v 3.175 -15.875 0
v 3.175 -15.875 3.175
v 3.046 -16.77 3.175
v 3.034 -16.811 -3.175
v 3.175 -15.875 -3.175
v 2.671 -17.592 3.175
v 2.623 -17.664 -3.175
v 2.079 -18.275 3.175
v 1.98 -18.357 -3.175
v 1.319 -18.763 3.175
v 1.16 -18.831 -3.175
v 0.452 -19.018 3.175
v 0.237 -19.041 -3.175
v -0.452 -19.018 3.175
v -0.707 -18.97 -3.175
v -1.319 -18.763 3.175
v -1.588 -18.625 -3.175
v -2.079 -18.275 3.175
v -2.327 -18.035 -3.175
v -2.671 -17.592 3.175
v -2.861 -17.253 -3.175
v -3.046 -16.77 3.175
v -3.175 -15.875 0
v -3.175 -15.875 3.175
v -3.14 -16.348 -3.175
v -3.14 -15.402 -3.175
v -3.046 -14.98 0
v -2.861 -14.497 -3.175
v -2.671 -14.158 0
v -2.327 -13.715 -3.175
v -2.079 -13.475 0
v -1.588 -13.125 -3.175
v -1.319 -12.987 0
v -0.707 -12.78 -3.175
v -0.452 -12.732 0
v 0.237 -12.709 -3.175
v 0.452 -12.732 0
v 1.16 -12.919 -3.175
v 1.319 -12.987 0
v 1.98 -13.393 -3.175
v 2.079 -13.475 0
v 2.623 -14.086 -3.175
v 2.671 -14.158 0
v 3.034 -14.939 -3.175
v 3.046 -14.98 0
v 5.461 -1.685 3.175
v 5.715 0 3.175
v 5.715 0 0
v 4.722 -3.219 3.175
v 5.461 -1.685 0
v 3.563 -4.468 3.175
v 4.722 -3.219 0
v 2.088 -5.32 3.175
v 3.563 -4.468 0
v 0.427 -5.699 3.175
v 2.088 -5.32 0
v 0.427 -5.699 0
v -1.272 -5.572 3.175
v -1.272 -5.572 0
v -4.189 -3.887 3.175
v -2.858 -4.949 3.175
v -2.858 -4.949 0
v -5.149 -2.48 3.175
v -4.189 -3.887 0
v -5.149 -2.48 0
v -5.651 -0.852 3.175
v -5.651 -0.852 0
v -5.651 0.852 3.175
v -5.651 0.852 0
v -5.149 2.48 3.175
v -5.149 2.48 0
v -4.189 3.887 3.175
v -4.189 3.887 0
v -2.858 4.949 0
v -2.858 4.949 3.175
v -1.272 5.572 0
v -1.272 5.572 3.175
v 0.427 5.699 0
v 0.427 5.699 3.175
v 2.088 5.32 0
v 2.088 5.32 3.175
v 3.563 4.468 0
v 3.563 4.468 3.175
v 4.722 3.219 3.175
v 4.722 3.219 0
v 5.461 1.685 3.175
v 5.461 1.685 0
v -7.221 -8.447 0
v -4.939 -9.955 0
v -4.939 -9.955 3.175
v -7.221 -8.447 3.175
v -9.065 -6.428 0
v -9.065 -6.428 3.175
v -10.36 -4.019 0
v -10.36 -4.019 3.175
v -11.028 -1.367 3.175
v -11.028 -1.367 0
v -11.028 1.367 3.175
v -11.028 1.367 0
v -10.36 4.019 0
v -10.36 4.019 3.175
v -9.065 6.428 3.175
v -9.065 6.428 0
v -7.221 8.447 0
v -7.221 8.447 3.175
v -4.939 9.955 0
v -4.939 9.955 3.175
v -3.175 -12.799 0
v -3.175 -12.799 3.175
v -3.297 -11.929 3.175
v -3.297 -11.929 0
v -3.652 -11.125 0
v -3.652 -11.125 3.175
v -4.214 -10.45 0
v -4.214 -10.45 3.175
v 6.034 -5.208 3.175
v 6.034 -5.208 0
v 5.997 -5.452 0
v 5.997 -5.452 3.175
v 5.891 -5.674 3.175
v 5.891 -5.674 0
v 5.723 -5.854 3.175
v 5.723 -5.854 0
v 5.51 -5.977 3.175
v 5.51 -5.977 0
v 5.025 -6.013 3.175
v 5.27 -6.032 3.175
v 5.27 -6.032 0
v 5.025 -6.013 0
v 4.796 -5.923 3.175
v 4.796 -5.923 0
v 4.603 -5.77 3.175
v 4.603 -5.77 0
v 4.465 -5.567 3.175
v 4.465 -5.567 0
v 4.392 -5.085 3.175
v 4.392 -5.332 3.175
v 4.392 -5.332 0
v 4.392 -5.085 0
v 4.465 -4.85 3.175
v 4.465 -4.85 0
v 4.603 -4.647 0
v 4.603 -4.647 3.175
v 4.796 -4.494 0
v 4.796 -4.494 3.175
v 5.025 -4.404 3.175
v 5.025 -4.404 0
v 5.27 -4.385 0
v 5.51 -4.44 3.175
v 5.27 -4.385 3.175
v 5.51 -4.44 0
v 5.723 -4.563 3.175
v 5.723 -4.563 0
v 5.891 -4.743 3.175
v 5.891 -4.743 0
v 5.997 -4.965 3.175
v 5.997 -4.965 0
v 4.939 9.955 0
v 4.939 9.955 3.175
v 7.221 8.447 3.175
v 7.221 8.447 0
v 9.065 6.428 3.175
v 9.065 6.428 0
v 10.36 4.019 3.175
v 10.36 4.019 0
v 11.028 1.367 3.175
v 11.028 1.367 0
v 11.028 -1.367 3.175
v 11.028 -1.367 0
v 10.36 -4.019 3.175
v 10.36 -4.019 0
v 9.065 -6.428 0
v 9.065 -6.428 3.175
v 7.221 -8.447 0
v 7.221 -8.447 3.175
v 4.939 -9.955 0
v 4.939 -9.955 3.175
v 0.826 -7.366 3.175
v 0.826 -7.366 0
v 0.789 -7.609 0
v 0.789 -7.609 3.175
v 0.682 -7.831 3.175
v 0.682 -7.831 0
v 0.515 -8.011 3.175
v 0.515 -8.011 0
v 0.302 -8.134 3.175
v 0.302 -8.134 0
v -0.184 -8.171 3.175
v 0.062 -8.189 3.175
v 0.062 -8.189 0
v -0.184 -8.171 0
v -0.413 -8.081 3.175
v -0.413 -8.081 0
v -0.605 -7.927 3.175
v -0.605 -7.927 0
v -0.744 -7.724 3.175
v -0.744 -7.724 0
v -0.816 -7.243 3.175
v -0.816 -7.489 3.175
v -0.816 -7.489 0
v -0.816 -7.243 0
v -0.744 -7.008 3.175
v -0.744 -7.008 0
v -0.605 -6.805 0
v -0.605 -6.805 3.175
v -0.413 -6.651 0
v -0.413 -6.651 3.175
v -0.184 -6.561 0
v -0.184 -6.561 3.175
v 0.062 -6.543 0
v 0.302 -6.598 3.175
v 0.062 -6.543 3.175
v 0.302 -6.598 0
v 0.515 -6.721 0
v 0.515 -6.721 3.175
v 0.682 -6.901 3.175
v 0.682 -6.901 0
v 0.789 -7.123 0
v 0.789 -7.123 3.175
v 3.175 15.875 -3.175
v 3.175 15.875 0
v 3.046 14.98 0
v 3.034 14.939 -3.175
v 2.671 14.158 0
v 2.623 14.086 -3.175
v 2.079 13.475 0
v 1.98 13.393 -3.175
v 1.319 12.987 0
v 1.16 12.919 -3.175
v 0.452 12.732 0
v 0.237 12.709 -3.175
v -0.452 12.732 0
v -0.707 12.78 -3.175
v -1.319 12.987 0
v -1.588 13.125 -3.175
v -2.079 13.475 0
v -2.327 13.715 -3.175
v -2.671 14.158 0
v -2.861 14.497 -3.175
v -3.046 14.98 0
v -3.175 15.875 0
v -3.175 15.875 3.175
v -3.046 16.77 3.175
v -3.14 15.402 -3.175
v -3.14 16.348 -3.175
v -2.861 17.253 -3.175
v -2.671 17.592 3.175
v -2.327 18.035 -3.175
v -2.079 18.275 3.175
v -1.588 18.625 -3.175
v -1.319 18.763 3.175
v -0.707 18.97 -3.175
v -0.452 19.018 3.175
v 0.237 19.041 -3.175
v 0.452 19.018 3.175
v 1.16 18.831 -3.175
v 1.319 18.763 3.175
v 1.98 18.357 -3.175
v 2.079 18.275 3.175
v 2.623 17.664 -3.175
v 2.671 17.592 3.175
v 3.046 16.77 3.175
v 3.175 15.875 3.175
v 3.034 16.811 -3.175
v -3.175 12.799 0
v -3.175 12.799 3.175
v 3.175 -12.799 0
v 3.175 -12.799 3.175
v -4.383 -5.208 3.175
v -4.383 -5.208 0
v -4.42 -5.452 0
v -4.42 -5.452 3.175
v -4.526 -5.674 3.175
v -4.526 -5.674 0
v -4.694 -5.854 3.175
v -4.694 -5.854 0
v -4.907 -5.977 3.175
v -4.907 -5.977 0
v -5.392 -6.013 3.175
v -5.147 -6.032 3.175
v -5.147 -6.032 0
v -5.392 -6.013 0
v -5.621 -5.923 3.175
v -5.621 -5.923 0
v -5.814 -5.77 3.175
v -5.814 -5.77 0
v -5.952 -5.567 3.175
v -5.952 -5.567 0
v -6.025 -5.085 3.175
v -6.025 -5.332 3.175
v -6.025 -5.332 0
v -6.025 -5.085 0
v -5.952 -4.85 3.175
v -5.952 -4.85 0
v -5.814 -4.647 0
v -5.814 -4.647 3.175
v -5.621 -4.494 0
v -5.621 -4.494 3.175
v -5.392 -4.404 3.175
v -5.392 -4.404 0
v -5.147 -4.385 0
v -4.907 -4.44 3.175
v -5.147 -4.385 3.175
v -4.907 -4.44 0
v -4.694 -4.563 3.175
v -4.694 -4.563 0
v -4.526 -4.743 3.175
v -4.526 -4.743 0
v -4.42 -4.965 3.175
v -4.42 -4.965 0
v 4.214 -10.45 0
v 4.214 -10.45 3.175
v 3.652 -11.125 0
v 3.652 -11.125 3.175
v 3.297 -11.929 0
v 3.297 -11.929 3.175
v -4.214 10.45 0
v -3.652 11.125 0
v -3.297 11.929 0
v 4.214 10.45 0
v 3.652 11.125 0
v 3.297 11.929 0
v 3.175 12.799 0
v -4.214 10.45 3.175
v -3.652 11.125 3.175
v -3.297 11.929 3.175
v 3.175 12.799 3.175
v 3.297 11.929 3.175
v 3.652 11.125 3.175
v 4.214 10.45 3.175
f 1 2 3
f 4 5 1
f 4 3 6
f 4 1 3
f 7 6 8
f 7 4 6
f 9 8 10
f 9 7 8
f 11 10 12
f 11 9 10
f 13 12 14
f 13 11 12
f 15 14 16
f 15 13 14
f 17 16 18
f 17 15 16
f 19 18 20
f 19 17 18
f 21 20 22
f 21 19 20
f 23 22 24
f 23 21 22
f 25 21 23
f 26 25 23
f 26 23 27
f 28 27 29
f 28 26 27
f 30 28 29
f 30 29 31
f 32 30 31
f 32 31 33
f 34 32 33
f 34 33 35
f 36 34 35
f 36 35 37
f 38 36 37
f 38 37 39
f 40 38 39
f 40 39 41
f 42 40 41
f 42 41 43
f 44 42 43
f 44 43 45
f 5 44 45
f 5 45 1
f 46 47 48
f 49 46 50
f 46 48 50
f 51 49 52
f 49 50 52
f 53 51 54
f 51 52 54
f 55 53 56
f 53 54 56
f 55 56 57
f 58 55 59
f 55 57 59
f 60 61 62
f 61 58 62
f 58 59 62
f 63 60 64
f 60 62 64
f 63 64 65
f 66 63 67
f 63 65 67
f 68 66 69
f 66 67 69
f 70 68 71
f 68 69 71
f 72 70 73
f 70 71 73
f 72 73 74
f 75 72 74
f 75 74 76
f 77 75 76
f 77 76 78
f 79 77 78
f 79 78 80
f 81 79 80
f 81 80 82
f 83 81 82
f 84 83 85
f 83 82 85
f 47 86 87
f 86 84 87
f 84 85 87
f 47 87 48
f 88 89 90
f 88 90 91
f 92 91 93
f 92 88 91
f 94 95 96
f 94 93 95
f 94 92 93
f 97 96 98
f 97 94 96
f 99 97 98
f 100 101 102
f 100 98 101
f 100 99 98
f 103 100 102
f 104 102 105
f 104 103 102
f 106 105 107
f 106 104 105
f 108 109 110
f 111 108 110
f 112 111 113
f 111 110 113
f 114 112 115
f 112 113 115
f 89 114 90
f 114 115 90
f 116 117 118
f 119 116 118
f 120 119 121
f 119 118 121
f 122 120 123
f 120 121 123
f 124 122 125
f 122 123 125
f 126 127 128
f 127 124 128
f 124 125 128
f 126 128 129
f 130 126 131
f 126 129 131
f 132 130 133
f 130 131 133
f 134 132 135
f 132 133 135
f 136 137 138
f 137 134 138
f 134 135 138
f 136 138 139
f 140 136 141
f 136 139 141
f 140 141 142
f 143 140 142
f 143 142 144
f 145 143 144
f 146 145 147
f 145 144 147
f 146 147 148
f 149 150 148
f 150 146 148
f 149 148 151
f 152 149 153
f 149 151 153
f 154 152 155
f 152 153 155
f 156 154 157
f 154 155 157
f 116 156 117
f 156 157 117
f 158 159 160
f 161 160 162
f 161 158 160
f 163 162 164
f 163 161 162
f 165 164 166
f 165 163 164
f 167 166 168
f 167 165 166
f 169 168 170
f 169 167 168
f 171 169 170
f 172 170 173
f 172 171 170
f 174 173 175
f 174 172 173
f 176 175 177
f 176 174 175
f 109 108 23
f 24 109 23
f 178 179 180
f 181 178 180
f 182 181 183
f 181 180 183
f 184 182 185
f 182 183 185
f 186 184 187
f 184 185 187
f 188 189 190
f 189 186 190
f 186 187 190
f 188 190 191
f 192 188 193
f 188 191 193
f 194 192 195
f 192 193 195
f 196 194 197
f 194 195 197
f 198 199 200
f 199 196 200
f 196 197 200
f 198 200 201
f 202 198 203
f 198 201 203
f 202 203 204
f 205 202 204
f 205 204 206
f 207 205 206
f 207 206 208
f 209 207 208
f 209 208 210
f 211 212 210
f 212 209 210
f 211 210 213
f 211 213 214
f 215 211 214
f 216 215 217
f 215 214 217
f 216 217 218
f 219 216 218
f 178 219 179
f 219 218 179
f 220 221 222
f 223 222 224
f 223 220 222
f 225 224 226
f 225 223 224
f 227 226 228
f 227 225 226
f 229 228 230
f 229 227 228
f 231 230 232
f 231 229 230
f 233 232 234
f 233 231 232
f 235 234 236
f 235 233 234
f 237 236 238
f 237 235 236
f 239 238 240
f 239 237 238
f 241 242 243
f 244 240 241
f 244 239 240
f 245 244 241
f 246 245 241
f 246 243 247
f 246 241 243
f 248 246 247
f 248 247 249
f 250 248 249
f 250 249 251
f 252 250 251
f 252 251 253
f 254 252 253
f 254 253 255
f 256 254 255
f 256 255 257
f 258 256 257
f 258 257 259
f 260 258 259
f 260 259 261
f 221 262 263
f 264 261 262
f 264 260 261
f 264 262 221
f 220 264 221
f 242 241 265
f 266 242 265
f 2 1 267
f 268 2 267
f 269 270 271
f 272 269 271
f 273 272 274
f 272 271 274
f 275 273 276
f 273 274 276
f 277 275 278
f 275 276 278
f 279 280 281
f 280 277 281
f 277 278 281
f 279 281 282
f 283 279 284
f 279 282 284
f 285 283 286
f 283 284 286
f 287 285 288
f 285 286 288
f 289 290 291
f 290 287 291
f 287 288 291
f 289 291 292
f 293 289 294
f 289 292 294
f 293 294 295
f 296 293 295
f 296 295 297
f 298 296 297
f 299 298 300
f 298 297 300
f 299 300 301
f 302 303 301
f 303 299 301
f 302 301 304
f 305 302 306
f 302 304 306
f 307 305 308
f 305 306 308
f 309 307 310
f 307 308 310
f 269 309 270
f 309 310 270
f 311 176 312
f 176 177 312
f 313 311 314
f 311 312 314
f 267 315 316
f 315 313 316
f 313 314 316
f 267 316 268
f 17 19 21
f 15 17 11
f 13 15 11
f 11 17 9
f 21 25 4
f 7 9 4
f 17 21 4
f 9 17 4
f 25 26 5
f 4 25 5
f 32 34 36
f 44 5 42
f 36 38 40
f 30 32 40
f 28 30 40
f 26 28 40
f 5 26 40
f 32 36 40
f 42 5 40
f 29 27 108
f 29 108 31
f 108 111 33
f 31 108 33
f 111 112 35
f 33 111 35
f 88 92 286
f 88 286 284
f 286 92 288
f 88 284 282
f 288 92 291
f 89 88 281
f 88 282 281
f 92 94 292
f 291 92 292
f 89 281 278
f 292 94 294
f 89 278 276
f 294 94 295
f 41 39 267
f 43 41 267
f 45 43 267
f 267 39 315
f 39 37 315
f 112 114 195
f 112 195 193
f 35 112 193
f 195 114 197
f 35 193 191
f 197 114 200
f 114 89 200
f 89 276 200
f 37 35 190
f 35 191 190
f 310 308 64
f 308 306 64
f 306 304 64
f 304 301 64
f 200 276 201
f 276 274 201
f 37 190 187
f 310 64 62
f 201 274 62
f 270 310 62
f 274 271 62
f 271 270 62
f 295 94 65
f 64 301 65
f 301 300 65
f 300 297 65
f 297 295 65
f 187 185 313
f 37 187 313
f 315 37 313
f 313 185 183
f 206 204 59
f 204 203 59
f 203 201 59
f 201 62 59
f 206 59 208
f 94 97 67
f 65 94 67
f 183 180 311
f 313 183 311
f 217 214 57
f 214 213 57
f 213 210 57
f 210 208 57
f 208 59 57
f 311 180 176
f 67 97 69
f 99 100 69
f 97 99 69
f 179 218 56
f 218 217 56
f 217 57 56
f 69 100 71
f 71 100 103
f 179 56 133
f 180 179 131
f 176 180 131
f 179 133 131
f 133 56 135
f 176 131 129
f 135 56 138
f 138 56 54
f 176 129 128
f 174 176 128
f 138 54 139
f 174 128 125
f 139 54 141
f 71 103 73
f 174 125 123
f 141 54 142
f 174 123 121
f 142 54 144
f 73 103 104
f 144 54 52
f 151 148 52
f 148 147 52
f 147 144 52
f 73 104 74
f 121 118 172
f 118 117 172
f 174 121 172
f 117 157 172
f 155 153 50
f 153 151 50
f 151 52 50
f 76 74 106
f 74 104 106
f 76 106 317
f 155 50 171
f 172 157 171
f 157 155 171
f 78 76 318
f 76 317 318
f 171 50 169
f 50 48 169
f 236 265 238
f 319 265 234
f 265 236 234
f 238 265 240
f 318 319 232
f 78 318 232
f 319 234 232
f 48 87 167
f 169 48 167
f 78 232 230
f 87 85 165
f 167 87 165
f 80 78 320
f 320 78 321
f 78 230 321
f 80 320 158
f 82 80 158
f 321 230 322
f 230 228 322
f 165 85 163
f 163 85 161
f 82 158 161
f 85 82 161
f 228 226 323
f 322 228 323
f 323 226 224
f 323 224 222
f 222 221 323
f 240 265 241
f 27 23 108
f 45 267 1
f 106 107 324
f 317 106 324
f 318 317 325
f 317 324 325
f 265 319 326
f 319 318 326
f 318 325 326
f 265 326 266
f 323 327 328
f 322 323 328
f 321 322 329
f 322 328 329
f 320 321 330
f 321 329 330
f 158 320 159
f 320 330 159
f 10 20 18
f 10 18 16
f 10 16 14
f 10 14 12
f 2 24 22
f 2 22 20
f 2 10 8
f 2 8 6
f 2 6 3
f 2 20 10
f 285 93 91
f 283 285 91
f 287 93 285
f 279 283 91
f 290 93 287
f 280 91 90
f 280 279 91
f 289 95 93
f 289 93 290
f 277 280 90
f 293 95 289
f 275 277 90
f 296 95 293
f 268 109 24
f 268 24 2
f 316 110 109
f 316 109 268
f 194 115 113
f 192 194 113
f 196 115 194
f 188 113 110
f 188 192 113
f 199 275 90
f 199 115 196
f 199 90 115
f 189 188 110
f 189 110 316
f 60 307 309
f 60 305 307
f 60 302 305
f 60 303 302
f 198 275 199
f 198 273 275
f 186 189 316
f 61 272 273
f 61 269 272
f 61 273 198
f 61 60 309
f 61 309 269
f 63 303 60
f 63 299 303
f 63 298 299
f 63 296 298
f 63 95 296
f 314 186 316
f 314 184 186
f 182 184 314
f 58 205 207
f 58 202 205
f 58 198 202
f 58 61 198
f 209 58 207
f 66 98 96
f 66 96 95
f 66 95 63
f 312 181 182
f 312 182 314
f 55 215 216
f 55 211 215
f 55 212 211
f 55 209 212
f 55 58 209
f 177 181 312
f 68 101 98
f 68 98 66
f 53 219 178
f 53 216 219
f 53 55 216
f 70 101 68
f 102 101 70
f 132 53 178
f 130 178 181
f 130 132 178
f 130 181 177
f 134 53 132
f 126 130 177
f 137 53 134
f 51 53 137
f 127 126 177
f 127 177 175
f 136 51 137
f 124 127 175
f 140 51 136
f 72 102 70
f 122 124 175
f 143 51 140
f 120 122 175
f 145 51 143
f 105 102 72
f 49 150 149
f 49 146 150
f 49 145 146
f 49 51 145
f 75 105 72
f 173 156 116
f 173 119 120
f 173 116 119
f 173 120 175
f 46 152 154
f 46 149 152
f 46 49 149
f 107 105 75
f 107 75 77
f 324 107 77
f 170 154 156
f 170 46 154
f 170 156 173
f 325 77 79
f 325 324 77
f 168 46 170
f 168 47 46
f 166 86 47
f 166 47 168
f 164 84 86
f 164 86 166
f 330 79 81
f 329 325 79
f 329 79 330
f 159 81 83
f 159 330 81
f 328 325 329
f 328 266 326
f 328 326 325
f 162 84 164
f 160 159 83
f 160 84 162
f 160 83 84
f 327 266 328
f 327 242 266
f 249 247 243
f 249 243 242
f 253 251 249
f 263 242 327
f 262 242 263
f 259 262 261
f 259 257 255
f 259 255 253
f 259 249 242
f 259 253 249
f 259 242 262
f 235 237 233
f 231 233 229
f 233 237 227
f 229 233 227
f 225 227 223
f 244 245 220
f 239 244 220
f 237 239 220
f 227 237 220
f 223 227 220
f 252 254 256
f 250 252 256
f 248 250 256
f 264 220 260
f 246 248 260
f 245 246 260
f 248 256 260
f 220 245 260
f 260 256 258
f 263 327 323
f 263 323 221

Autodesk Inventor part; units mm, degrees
ref_plane "YZ Plane" through (0, 0, 0) normal (1, 0, 0) x (0, 1, 0)
ref_plane "XZ Plane" through (0, 0, 0) normal (0, 1, 0) x (-1, 0, 0)
ref_plane "XY Plane" through (0, 0, 0) normal (0, 0, 1) x (1, 0, 0)
sketch "Sketch1" plane through (0, 0, 0) normal (0, 0, 1) x (1, 0, 0)
  circle A0 centre (0, 0) radius 5.715
  circle A1 centre (0, 0) radius 15.875 construction
  circle A2 centre (0, 15.875) radius 3.175
  circle A3 centre (0, -15.875) radius 3.175
  circle A4 centre (0, 0) radius 11.1125
  line L0 (0, 15.875) -> (0, -15.875) construction
  line L1 (-3.175, 15.875) -> (-3.175, -15.875)
  line L2 (3.175, -15.875) -> (3.175, 15.875)
  arc A5 (3.175, 15.875) -> (-3.175, 15.875) centre (0, 15.875) ccw
  arc A6 (-3.175, -15.875) -> (3.175, -15.875) centre (0, -15.875) ccw
  circle A7 centre (0, -7.366) radius 0.8255
  circle A8 centre (0, 0) radius 7.366 construction
  circle A9 centre (5.2085, -5.2085) radius 0.8255
  circle A10 centre (-5.2085, -5.2085) radius 0.8255
  point P0 (-3.175, 10.6493)
  point P1 (-3.175, -10.6493)
  point P2 (3.175, -10.6493)
  point P3 (3.175, 10.6493)
  point P4 (3.175, 15.875)
  point P5 (3.175, -15.875)
  dimension "d0" = 11.43
  dimension "d1" = 31.75
  dimension "d2" = 6.35
  dimension "d3" = 22.225
  dimension "d6" = 1.651
  dimension "d12" = 14.732
  dimension "d13" = 45
  dimension "d14" = 45
extrude "Extrusion1" add sketch "Sketch1" along normal blind 3.175 contours A0 L2 A4 | A0 L1 A4 L2 | L2 A4 L1 A0 | A0 L1 A4 | A4 L1 A2 L2 | L2 A3 L1 A4 | A2 | A3
extrude "Extrusion2" add sketch "Sketch1" against normal blind 3.175 contours A2 | A3
fillet "Fillet1" radius 3.175 4 edges at (-3.175, -10.6493, 1.5875) (3.175, -10.6493, 1.5875) (-3.175, 10.6493, 1.5875) (3.175, 10.6493, 1.5875)
properties part number "EncoderPinRetainer" material "ABS Plastic"
